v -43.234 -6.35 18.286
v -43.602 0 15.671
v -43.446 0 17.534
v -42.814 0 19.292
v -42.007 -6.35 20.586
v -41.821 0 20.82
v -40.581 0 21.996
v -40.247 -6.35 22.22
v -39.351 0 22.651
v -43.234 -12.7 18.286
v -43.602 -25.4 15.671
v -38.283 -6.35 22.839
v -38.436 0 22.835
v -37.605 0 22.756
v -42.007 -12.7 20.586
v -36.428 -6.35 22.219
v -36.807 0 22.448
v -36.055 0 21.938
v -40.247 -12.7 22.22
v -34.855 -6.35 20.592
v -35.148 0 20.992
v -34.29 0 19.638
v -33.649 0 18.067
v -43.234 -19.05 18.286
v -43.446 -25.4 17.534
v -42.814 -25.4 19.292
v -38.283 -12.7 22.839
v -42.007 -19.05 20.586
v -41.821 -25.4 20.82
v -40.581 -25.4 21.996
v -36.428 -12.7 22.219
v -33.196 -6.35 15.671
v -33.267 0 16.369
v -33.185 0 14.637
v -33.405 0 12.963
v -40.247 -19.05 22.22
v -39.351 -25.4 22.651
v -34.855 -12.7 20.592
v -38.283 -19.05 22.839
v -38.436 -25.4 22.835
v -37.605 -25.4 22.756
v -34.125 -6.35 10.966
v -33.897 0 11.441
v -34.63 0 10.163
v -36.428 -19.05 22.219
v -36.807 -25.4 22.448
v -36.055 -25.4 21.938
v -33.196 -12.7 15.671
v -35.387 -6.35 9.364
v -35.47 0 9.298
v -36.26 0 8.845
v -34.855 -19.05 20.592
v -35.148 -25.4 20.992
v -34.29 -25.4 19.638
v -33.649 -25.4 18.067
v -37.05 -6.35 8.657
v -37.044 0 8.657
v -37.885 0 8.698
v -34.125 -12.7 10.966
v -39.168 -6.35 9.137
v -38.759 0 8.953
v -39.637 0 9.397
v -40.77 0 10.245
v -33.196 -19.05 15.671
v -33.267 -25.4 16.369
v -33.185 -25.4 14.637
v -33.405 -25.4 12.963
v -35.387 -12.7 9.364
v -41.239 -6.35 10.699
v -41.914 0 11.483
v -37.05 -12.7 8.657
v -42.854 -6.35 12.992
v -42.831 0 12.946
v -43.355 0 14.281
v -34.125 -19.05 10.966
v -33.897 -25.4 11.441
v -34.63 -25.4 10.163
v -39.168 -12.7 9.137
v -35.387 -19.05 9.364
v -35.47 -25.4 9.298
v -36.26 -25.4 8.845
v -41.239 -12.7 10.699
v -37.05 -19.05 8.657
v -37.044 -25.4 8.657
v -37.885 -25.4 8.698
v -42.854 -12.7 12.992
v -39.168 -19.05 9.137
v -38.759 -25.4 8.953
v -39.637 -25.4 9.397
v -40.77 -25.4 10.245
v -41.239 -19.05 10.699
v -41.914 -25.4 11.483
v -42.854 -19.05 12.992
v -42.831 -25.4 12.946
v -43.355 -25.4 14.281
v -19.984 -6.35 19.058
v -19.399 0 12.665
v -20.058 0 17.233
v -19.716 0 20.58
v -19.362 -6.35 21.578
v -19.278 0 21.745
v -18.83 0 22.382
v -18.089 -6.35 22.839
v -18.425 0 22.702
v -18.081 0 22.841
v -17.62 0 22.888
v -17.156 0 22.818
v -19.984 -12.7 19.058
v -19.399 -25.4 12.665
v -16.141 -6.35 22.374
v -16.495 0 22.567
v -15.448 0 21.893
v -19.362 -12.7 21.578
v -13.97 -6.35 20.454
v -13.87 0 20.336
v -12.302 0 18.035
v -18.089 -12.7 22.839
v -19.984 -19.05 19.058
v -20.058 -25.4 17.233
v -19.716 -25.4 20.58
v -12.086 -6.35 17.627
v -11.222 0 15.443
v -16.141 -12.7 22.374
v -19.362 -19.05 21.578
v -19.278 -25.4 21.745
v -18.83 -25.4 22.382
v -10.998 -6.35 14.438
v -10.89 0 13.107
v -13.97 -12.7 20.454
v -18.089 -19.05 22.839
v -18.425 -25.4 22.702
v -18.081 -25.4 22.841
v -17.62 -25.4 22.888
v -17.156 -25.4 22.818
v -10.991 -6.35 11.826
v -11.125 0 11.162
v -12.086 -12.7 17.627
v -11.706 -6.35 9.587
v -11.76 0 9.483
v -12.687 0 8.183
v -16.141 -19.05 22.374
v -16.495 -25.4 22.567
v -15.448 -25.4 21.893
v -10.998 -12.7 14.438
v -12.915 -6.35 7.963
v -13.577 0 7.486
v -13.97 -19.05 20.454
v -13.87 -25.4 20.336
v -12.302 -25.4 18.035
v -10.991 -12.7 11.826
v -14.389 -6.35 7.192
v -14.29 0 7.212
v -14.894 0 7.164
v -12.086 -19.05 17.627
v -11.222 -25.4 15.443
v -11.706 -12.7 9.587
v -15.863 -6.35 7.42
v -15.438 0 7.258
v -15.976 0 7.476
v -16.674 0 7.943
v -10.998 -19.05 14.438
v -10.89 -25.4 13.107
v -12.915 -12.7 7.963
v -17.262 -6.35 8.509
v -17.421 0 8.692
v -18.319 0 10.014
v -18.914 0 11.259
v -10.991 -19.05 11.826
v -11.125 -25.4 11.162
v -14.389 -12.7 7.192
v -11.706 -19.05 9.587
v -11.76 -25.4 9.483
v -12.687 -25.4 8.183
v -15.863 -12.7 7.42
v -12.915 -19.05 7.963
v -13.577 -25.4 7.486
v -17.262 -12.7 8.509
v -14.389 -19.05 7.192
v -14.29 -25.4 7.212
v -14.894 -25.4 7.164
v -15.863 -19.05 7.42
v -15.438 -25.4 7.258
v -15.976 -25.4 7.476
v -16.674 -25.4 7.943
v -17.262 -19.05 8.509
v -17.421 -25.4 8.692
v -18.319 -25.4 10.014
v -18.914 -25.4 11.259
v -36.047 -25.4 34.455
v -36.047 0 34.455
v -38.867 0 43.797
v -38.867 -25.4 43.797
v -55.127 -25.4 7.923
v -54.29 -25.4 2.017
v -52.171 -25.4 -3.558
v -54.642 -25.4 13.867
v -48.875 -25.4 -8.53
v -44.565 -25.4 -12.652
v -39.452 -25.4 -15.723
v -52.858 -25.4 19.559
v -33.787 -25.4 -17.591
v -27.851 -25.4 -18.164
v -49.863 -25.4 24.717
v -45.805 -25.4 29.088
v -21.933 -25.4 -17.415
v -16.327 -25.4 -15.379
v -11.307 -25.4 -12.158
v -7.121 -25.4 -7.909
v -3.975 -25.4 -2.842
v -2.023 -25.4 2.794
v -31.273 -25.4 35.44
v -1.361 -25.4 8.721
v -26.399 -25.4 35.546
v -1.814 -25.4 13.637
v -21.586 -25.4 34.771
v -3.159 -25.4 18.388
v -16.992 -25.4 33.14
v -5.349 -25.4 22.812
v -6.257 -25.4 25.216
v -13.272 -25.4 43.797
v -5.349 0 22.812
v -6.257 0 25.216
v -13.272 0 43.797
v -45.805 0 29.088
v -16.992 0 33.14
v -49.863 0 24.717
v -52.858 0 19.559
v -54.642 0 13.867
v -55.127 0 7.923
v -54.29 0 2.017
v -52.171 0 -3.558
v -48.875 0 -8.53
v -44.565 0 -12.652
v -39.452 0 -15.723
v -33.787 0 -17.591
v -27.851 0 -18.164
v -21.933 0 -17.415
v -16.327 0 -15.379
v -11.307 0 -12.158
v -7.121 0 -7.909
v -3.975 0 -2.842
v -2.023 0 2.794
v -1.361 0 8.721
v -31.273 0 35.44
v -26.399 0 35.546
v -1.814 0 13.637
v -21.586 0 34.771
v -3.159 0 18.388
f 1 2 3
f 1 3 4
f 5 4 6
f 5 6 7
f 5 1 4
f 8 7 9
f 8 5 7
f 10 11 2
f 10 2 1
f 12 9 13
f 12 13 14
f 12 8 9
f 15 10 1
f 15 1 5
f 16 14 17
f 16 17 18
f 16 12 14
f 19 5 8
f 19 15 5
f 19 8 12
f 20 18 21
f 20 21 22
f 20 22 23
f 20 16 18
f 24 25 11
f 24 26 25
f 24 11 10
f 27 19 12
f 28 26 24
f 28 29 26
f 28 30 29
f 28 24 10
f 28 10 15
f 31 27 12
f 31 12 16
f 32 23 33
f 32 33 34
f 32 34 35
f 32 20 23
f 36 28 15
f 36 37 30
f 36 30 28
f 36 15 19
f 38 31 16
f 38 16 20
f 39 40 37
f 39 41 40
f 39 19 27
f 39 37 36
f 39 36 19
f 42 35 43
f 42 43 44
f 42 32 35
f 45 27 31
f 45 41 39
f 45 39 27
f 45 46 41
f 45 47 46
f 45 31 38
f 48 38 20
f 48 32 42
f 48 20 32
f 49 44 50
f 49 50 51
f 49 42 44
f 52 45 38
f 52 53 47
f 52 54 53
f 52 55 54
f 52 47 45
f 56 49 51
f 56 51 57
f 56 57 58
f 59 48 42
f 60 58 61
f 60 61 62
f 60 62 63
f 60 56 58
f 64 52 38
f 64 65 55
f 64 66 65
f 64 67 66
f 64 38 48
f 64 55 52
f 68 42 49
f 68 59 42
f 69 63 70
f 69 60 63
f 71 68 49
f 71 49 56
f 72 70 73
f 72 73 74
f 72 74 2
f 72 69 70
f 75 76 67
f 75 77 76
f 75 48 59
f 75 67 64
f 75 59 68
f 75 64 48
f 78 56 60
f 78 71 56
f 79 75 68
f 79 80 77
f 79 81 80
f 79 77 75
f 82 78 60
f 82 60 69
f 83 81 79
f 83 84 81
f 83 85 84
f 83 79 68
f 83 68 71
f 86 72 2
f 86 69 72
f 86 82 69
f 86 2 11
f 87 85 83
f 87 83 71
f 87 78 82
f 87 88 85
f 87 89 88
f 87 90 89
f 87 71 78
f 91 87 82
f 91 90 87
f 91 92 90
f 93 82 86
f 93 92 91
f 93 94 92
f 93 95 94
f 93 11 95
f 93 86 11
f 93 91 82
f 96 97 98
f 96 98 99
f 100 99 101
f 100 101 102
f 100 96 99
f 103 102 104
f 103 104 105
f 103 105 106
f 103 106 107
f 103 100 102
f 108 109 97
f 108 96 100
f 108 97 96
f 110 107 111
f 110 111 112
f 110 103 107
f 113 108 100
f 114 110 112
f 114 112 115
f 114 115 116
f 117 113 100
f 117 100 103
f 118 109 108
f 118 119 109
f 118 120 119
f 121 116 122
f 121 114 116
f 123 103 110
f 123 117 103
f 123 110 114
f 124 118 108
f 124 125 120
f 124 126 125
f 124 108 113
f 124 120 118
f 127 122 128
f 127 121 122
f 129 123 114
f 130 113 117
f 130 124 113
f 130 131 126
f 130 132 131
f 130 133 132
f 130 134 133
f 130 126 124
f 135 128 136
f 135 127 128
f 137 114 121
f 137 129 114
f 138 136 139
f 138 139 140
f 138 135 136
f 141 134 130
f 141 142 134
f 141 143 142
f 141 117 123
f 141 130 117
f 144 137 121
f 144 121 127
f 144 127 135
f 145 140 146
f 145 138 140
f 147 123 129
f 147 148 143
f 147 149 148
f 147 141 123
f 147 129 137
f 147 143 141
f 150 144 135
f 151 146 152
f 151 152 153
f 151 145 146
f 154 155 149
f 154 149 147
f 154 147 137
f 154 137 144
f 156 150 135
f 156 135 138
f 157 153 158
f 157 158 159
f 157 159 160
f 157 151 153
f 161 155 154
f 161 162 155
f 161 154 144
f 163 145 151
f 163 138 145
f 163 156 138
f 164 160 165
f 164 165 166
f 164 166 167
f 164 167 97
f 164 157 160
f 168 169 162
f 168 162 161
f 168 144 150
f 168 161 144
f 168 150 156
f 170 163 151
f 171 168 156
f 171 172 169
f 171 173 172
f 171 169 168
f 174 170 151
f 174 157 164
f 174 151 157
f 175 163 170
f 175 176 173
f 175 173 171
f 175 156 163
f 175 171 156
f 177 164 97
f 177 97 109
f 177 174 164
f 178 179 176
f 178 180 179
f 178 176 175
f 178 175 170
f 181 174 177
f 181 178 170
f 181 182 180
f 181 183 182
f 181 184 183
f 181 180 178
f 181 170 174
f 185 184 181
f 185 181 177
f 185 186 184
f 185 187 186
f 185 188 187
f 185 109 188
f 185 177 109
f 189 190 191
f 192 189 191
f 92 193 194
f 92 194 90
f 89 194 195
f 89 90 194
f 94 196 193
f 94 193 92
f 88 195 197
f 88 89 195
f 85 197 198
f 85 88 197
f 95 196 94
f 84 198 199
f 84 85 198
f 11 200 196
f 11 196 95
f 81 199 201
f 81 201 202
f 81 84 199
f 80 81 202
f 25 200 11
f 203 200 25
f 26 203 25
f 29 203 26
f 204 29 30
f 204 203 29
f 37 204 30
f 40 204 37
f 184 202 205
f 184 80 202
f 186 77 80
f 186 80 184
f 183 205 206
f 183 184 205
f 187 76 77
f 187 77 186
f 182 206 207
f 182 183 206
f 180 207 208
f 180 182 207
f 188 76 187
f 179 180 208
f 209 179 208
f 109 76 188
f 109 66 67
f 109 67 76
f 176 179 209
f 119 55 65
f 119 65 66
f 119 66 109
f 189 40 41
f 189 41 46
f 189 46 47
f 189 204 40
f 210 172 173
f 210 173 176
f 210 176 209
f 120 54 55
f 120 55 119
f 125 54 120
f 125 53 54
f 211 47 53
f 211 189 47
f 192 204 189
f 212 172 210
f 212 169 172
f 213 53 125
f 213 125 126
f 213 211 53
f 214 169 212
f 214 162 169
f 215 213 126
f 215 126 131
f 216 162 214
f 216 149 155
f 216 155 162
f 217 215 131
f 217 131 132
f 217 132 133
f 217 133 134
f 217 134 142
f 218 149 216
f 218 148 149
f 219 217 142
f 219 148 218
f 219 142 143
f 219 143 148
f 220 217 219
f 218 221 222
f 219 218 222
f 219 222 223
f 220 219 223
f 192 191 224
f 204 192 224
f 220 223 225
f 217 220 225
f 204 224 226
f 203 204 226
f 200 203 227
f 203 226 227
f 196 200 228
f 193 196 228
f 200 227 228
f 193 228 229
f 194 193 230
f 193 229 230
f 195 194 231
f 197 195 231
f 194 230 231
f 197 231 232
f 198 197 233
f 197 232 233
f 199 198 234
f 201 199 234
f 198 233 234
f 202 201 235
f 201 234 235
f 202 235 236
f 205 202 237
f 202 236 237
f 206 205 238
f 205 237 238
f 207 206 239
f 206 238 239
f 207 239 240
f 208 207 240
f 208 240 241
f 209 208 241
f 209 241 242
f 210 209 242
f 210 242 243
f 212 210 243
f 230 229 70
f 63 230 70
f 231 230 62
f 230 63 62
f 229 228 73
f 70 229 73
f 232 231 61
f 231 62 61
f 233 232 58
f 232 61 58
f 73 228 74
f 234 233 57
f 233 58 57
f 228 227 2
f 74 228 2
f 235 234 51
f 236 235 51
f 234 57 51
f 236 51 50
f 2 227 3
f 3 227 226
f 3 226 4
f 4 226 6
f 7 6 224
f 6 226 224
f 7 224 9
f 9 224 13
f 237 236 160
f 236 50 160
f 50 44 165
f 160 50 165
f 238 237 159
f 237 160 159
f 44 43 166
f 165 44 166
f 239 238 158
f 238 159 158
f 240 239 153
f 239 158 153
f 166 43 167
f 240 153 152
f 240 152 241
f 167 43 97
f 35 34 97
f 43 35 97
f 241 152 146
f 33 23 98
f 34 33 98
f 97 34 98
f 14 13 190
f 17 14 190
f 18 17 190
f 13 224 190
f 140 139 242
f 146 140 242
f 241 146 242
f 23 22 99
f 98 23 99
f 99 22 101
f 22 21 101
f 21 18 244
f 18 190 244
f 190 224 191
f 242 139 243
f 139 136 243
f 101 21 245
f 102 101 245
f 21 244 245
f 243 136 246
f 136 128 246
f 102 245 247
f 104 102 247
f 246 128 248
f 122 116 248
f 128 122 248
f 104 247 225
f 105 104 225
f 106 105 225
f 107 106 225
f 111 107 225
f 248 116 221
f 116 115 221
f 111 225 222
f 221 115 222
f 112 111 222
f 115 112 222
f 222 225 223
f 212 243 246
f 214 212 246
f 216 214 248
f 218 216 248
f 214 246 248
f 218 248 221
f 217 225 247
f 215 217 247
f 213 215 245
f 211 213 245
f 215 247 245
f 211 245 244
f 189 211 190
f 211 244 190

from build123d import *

# Parameters (mm, degrees)
F1_DEPTH      = 25.4
F4_DEPTH      = 25.4
F4_DEPTH_BACK = 25.4


with BuildPart() as f1:
    # F0 (on Front) → F1 (new body)
    with BuildSketch(Plane.XZ):
        with BuildLine():
            Line((-38.8674177229, 43.7969453633), (-45.8054386887, 29.0883398254))
            ThreePointArc((-45.8054386887, 29.0883398254), (-41.2071804211, 32.2823378336), (-36.0471665706, 34.4548615813))
            Line((-36.0471665706, 34.4548615813), (-38.8674177229, 43.7969453633))
        make_face()
        with BuildLine():
            ThreePointArc((-36.0471665706, 34.4548615813), (-41.2071804211, 32.2823378336), (-45.8054386887, 29.0883398254))
            ThreePointArc((-45.8054386887, 29.0883398254), (-39.451754684, -15.7228317616), (-1.3612498151, 8.7214689702))
            ThreePointArc((-1.3612498151, 8.7214689702), (-2.3773821218, 16.0435236141), (-5.3489792102, 22.812173392))
            ThreePointArc((-5.3489792102, 22.812173392), (-10.4068166043, 28.8367686087), (-16.9917411152, 33.1398182034))
            ThreePointArc((-16.9917411152, 33.1398182034), (-26.3987489938, 35.5463941766), (-36.0471665706, 34.4548615813))
        make_face()
        with BuildLine():
            Line((-13.2718011737, 43.7969453633), (-16.9917411152, 33.1398182034))
            ThreePointArc((-16.9917411152, 33.1398182034), (-10.4068166043, 28.8367686087), (-5.3489792102, 22.812173392))
            Line((-5.3489792102, 22.812173392), (-6.2567060813, 25.2164229751))
            Line((-6.2567060813, 25.2164229751), (-13.2718011737, 43.7969453633))
        make_face()
    extrude(amount=F1_DEPTH)

    # F3 (on face) → F4 (cut, two sides)
    with BuildSketch(Plane.XZ.offset(25.4)) as f4_sk:
        with BuildLine():
            add(Edge.make_bspline(
                [(-43.6015054584, 15.6709384173), (-43.8301012215, 19.2130171989), (-37.9776729192, 26.4504401405), (-31.2640295651, 15.8171303164), (-36.3976958419, 5.1570202595), (-43.3644576515, 11.9978956825), (-43.6015054584, 15.6709384173)],
                knots=[0, 0, 0, 0, 0.2514936223, 0.5010664949, 0.7392077141, 1, 1, 1, 1], degree=3))
        make_face()
        with BuildLine():
            add(Edge.make_bspline(
                [(-19.399119541, 12.6649094746), (-20.5583896188, 16.7179968612), (-19.9003224656, 28.0124505421), (-8.1295193877, 14.6423829602), (-14.2177906593, 4.3978450265), (-18.4132153869, 9.2179511098), (-19.399119541, 12.6649094746)],
                knots=[0, 0, 0, 0, 0.2653381809, 0.5400270912, 0.7743424765, 1, 1, 1, 1], degree=3))
        make_face()
    extrude(amount=F4_DEPTH, mode=Mode.SUBTRACT)
    extrude(f4_sk.sketch, amount=-F4_DEPTH_BACK, mode=Mode.SUBTRACT)


solid = f1.part
